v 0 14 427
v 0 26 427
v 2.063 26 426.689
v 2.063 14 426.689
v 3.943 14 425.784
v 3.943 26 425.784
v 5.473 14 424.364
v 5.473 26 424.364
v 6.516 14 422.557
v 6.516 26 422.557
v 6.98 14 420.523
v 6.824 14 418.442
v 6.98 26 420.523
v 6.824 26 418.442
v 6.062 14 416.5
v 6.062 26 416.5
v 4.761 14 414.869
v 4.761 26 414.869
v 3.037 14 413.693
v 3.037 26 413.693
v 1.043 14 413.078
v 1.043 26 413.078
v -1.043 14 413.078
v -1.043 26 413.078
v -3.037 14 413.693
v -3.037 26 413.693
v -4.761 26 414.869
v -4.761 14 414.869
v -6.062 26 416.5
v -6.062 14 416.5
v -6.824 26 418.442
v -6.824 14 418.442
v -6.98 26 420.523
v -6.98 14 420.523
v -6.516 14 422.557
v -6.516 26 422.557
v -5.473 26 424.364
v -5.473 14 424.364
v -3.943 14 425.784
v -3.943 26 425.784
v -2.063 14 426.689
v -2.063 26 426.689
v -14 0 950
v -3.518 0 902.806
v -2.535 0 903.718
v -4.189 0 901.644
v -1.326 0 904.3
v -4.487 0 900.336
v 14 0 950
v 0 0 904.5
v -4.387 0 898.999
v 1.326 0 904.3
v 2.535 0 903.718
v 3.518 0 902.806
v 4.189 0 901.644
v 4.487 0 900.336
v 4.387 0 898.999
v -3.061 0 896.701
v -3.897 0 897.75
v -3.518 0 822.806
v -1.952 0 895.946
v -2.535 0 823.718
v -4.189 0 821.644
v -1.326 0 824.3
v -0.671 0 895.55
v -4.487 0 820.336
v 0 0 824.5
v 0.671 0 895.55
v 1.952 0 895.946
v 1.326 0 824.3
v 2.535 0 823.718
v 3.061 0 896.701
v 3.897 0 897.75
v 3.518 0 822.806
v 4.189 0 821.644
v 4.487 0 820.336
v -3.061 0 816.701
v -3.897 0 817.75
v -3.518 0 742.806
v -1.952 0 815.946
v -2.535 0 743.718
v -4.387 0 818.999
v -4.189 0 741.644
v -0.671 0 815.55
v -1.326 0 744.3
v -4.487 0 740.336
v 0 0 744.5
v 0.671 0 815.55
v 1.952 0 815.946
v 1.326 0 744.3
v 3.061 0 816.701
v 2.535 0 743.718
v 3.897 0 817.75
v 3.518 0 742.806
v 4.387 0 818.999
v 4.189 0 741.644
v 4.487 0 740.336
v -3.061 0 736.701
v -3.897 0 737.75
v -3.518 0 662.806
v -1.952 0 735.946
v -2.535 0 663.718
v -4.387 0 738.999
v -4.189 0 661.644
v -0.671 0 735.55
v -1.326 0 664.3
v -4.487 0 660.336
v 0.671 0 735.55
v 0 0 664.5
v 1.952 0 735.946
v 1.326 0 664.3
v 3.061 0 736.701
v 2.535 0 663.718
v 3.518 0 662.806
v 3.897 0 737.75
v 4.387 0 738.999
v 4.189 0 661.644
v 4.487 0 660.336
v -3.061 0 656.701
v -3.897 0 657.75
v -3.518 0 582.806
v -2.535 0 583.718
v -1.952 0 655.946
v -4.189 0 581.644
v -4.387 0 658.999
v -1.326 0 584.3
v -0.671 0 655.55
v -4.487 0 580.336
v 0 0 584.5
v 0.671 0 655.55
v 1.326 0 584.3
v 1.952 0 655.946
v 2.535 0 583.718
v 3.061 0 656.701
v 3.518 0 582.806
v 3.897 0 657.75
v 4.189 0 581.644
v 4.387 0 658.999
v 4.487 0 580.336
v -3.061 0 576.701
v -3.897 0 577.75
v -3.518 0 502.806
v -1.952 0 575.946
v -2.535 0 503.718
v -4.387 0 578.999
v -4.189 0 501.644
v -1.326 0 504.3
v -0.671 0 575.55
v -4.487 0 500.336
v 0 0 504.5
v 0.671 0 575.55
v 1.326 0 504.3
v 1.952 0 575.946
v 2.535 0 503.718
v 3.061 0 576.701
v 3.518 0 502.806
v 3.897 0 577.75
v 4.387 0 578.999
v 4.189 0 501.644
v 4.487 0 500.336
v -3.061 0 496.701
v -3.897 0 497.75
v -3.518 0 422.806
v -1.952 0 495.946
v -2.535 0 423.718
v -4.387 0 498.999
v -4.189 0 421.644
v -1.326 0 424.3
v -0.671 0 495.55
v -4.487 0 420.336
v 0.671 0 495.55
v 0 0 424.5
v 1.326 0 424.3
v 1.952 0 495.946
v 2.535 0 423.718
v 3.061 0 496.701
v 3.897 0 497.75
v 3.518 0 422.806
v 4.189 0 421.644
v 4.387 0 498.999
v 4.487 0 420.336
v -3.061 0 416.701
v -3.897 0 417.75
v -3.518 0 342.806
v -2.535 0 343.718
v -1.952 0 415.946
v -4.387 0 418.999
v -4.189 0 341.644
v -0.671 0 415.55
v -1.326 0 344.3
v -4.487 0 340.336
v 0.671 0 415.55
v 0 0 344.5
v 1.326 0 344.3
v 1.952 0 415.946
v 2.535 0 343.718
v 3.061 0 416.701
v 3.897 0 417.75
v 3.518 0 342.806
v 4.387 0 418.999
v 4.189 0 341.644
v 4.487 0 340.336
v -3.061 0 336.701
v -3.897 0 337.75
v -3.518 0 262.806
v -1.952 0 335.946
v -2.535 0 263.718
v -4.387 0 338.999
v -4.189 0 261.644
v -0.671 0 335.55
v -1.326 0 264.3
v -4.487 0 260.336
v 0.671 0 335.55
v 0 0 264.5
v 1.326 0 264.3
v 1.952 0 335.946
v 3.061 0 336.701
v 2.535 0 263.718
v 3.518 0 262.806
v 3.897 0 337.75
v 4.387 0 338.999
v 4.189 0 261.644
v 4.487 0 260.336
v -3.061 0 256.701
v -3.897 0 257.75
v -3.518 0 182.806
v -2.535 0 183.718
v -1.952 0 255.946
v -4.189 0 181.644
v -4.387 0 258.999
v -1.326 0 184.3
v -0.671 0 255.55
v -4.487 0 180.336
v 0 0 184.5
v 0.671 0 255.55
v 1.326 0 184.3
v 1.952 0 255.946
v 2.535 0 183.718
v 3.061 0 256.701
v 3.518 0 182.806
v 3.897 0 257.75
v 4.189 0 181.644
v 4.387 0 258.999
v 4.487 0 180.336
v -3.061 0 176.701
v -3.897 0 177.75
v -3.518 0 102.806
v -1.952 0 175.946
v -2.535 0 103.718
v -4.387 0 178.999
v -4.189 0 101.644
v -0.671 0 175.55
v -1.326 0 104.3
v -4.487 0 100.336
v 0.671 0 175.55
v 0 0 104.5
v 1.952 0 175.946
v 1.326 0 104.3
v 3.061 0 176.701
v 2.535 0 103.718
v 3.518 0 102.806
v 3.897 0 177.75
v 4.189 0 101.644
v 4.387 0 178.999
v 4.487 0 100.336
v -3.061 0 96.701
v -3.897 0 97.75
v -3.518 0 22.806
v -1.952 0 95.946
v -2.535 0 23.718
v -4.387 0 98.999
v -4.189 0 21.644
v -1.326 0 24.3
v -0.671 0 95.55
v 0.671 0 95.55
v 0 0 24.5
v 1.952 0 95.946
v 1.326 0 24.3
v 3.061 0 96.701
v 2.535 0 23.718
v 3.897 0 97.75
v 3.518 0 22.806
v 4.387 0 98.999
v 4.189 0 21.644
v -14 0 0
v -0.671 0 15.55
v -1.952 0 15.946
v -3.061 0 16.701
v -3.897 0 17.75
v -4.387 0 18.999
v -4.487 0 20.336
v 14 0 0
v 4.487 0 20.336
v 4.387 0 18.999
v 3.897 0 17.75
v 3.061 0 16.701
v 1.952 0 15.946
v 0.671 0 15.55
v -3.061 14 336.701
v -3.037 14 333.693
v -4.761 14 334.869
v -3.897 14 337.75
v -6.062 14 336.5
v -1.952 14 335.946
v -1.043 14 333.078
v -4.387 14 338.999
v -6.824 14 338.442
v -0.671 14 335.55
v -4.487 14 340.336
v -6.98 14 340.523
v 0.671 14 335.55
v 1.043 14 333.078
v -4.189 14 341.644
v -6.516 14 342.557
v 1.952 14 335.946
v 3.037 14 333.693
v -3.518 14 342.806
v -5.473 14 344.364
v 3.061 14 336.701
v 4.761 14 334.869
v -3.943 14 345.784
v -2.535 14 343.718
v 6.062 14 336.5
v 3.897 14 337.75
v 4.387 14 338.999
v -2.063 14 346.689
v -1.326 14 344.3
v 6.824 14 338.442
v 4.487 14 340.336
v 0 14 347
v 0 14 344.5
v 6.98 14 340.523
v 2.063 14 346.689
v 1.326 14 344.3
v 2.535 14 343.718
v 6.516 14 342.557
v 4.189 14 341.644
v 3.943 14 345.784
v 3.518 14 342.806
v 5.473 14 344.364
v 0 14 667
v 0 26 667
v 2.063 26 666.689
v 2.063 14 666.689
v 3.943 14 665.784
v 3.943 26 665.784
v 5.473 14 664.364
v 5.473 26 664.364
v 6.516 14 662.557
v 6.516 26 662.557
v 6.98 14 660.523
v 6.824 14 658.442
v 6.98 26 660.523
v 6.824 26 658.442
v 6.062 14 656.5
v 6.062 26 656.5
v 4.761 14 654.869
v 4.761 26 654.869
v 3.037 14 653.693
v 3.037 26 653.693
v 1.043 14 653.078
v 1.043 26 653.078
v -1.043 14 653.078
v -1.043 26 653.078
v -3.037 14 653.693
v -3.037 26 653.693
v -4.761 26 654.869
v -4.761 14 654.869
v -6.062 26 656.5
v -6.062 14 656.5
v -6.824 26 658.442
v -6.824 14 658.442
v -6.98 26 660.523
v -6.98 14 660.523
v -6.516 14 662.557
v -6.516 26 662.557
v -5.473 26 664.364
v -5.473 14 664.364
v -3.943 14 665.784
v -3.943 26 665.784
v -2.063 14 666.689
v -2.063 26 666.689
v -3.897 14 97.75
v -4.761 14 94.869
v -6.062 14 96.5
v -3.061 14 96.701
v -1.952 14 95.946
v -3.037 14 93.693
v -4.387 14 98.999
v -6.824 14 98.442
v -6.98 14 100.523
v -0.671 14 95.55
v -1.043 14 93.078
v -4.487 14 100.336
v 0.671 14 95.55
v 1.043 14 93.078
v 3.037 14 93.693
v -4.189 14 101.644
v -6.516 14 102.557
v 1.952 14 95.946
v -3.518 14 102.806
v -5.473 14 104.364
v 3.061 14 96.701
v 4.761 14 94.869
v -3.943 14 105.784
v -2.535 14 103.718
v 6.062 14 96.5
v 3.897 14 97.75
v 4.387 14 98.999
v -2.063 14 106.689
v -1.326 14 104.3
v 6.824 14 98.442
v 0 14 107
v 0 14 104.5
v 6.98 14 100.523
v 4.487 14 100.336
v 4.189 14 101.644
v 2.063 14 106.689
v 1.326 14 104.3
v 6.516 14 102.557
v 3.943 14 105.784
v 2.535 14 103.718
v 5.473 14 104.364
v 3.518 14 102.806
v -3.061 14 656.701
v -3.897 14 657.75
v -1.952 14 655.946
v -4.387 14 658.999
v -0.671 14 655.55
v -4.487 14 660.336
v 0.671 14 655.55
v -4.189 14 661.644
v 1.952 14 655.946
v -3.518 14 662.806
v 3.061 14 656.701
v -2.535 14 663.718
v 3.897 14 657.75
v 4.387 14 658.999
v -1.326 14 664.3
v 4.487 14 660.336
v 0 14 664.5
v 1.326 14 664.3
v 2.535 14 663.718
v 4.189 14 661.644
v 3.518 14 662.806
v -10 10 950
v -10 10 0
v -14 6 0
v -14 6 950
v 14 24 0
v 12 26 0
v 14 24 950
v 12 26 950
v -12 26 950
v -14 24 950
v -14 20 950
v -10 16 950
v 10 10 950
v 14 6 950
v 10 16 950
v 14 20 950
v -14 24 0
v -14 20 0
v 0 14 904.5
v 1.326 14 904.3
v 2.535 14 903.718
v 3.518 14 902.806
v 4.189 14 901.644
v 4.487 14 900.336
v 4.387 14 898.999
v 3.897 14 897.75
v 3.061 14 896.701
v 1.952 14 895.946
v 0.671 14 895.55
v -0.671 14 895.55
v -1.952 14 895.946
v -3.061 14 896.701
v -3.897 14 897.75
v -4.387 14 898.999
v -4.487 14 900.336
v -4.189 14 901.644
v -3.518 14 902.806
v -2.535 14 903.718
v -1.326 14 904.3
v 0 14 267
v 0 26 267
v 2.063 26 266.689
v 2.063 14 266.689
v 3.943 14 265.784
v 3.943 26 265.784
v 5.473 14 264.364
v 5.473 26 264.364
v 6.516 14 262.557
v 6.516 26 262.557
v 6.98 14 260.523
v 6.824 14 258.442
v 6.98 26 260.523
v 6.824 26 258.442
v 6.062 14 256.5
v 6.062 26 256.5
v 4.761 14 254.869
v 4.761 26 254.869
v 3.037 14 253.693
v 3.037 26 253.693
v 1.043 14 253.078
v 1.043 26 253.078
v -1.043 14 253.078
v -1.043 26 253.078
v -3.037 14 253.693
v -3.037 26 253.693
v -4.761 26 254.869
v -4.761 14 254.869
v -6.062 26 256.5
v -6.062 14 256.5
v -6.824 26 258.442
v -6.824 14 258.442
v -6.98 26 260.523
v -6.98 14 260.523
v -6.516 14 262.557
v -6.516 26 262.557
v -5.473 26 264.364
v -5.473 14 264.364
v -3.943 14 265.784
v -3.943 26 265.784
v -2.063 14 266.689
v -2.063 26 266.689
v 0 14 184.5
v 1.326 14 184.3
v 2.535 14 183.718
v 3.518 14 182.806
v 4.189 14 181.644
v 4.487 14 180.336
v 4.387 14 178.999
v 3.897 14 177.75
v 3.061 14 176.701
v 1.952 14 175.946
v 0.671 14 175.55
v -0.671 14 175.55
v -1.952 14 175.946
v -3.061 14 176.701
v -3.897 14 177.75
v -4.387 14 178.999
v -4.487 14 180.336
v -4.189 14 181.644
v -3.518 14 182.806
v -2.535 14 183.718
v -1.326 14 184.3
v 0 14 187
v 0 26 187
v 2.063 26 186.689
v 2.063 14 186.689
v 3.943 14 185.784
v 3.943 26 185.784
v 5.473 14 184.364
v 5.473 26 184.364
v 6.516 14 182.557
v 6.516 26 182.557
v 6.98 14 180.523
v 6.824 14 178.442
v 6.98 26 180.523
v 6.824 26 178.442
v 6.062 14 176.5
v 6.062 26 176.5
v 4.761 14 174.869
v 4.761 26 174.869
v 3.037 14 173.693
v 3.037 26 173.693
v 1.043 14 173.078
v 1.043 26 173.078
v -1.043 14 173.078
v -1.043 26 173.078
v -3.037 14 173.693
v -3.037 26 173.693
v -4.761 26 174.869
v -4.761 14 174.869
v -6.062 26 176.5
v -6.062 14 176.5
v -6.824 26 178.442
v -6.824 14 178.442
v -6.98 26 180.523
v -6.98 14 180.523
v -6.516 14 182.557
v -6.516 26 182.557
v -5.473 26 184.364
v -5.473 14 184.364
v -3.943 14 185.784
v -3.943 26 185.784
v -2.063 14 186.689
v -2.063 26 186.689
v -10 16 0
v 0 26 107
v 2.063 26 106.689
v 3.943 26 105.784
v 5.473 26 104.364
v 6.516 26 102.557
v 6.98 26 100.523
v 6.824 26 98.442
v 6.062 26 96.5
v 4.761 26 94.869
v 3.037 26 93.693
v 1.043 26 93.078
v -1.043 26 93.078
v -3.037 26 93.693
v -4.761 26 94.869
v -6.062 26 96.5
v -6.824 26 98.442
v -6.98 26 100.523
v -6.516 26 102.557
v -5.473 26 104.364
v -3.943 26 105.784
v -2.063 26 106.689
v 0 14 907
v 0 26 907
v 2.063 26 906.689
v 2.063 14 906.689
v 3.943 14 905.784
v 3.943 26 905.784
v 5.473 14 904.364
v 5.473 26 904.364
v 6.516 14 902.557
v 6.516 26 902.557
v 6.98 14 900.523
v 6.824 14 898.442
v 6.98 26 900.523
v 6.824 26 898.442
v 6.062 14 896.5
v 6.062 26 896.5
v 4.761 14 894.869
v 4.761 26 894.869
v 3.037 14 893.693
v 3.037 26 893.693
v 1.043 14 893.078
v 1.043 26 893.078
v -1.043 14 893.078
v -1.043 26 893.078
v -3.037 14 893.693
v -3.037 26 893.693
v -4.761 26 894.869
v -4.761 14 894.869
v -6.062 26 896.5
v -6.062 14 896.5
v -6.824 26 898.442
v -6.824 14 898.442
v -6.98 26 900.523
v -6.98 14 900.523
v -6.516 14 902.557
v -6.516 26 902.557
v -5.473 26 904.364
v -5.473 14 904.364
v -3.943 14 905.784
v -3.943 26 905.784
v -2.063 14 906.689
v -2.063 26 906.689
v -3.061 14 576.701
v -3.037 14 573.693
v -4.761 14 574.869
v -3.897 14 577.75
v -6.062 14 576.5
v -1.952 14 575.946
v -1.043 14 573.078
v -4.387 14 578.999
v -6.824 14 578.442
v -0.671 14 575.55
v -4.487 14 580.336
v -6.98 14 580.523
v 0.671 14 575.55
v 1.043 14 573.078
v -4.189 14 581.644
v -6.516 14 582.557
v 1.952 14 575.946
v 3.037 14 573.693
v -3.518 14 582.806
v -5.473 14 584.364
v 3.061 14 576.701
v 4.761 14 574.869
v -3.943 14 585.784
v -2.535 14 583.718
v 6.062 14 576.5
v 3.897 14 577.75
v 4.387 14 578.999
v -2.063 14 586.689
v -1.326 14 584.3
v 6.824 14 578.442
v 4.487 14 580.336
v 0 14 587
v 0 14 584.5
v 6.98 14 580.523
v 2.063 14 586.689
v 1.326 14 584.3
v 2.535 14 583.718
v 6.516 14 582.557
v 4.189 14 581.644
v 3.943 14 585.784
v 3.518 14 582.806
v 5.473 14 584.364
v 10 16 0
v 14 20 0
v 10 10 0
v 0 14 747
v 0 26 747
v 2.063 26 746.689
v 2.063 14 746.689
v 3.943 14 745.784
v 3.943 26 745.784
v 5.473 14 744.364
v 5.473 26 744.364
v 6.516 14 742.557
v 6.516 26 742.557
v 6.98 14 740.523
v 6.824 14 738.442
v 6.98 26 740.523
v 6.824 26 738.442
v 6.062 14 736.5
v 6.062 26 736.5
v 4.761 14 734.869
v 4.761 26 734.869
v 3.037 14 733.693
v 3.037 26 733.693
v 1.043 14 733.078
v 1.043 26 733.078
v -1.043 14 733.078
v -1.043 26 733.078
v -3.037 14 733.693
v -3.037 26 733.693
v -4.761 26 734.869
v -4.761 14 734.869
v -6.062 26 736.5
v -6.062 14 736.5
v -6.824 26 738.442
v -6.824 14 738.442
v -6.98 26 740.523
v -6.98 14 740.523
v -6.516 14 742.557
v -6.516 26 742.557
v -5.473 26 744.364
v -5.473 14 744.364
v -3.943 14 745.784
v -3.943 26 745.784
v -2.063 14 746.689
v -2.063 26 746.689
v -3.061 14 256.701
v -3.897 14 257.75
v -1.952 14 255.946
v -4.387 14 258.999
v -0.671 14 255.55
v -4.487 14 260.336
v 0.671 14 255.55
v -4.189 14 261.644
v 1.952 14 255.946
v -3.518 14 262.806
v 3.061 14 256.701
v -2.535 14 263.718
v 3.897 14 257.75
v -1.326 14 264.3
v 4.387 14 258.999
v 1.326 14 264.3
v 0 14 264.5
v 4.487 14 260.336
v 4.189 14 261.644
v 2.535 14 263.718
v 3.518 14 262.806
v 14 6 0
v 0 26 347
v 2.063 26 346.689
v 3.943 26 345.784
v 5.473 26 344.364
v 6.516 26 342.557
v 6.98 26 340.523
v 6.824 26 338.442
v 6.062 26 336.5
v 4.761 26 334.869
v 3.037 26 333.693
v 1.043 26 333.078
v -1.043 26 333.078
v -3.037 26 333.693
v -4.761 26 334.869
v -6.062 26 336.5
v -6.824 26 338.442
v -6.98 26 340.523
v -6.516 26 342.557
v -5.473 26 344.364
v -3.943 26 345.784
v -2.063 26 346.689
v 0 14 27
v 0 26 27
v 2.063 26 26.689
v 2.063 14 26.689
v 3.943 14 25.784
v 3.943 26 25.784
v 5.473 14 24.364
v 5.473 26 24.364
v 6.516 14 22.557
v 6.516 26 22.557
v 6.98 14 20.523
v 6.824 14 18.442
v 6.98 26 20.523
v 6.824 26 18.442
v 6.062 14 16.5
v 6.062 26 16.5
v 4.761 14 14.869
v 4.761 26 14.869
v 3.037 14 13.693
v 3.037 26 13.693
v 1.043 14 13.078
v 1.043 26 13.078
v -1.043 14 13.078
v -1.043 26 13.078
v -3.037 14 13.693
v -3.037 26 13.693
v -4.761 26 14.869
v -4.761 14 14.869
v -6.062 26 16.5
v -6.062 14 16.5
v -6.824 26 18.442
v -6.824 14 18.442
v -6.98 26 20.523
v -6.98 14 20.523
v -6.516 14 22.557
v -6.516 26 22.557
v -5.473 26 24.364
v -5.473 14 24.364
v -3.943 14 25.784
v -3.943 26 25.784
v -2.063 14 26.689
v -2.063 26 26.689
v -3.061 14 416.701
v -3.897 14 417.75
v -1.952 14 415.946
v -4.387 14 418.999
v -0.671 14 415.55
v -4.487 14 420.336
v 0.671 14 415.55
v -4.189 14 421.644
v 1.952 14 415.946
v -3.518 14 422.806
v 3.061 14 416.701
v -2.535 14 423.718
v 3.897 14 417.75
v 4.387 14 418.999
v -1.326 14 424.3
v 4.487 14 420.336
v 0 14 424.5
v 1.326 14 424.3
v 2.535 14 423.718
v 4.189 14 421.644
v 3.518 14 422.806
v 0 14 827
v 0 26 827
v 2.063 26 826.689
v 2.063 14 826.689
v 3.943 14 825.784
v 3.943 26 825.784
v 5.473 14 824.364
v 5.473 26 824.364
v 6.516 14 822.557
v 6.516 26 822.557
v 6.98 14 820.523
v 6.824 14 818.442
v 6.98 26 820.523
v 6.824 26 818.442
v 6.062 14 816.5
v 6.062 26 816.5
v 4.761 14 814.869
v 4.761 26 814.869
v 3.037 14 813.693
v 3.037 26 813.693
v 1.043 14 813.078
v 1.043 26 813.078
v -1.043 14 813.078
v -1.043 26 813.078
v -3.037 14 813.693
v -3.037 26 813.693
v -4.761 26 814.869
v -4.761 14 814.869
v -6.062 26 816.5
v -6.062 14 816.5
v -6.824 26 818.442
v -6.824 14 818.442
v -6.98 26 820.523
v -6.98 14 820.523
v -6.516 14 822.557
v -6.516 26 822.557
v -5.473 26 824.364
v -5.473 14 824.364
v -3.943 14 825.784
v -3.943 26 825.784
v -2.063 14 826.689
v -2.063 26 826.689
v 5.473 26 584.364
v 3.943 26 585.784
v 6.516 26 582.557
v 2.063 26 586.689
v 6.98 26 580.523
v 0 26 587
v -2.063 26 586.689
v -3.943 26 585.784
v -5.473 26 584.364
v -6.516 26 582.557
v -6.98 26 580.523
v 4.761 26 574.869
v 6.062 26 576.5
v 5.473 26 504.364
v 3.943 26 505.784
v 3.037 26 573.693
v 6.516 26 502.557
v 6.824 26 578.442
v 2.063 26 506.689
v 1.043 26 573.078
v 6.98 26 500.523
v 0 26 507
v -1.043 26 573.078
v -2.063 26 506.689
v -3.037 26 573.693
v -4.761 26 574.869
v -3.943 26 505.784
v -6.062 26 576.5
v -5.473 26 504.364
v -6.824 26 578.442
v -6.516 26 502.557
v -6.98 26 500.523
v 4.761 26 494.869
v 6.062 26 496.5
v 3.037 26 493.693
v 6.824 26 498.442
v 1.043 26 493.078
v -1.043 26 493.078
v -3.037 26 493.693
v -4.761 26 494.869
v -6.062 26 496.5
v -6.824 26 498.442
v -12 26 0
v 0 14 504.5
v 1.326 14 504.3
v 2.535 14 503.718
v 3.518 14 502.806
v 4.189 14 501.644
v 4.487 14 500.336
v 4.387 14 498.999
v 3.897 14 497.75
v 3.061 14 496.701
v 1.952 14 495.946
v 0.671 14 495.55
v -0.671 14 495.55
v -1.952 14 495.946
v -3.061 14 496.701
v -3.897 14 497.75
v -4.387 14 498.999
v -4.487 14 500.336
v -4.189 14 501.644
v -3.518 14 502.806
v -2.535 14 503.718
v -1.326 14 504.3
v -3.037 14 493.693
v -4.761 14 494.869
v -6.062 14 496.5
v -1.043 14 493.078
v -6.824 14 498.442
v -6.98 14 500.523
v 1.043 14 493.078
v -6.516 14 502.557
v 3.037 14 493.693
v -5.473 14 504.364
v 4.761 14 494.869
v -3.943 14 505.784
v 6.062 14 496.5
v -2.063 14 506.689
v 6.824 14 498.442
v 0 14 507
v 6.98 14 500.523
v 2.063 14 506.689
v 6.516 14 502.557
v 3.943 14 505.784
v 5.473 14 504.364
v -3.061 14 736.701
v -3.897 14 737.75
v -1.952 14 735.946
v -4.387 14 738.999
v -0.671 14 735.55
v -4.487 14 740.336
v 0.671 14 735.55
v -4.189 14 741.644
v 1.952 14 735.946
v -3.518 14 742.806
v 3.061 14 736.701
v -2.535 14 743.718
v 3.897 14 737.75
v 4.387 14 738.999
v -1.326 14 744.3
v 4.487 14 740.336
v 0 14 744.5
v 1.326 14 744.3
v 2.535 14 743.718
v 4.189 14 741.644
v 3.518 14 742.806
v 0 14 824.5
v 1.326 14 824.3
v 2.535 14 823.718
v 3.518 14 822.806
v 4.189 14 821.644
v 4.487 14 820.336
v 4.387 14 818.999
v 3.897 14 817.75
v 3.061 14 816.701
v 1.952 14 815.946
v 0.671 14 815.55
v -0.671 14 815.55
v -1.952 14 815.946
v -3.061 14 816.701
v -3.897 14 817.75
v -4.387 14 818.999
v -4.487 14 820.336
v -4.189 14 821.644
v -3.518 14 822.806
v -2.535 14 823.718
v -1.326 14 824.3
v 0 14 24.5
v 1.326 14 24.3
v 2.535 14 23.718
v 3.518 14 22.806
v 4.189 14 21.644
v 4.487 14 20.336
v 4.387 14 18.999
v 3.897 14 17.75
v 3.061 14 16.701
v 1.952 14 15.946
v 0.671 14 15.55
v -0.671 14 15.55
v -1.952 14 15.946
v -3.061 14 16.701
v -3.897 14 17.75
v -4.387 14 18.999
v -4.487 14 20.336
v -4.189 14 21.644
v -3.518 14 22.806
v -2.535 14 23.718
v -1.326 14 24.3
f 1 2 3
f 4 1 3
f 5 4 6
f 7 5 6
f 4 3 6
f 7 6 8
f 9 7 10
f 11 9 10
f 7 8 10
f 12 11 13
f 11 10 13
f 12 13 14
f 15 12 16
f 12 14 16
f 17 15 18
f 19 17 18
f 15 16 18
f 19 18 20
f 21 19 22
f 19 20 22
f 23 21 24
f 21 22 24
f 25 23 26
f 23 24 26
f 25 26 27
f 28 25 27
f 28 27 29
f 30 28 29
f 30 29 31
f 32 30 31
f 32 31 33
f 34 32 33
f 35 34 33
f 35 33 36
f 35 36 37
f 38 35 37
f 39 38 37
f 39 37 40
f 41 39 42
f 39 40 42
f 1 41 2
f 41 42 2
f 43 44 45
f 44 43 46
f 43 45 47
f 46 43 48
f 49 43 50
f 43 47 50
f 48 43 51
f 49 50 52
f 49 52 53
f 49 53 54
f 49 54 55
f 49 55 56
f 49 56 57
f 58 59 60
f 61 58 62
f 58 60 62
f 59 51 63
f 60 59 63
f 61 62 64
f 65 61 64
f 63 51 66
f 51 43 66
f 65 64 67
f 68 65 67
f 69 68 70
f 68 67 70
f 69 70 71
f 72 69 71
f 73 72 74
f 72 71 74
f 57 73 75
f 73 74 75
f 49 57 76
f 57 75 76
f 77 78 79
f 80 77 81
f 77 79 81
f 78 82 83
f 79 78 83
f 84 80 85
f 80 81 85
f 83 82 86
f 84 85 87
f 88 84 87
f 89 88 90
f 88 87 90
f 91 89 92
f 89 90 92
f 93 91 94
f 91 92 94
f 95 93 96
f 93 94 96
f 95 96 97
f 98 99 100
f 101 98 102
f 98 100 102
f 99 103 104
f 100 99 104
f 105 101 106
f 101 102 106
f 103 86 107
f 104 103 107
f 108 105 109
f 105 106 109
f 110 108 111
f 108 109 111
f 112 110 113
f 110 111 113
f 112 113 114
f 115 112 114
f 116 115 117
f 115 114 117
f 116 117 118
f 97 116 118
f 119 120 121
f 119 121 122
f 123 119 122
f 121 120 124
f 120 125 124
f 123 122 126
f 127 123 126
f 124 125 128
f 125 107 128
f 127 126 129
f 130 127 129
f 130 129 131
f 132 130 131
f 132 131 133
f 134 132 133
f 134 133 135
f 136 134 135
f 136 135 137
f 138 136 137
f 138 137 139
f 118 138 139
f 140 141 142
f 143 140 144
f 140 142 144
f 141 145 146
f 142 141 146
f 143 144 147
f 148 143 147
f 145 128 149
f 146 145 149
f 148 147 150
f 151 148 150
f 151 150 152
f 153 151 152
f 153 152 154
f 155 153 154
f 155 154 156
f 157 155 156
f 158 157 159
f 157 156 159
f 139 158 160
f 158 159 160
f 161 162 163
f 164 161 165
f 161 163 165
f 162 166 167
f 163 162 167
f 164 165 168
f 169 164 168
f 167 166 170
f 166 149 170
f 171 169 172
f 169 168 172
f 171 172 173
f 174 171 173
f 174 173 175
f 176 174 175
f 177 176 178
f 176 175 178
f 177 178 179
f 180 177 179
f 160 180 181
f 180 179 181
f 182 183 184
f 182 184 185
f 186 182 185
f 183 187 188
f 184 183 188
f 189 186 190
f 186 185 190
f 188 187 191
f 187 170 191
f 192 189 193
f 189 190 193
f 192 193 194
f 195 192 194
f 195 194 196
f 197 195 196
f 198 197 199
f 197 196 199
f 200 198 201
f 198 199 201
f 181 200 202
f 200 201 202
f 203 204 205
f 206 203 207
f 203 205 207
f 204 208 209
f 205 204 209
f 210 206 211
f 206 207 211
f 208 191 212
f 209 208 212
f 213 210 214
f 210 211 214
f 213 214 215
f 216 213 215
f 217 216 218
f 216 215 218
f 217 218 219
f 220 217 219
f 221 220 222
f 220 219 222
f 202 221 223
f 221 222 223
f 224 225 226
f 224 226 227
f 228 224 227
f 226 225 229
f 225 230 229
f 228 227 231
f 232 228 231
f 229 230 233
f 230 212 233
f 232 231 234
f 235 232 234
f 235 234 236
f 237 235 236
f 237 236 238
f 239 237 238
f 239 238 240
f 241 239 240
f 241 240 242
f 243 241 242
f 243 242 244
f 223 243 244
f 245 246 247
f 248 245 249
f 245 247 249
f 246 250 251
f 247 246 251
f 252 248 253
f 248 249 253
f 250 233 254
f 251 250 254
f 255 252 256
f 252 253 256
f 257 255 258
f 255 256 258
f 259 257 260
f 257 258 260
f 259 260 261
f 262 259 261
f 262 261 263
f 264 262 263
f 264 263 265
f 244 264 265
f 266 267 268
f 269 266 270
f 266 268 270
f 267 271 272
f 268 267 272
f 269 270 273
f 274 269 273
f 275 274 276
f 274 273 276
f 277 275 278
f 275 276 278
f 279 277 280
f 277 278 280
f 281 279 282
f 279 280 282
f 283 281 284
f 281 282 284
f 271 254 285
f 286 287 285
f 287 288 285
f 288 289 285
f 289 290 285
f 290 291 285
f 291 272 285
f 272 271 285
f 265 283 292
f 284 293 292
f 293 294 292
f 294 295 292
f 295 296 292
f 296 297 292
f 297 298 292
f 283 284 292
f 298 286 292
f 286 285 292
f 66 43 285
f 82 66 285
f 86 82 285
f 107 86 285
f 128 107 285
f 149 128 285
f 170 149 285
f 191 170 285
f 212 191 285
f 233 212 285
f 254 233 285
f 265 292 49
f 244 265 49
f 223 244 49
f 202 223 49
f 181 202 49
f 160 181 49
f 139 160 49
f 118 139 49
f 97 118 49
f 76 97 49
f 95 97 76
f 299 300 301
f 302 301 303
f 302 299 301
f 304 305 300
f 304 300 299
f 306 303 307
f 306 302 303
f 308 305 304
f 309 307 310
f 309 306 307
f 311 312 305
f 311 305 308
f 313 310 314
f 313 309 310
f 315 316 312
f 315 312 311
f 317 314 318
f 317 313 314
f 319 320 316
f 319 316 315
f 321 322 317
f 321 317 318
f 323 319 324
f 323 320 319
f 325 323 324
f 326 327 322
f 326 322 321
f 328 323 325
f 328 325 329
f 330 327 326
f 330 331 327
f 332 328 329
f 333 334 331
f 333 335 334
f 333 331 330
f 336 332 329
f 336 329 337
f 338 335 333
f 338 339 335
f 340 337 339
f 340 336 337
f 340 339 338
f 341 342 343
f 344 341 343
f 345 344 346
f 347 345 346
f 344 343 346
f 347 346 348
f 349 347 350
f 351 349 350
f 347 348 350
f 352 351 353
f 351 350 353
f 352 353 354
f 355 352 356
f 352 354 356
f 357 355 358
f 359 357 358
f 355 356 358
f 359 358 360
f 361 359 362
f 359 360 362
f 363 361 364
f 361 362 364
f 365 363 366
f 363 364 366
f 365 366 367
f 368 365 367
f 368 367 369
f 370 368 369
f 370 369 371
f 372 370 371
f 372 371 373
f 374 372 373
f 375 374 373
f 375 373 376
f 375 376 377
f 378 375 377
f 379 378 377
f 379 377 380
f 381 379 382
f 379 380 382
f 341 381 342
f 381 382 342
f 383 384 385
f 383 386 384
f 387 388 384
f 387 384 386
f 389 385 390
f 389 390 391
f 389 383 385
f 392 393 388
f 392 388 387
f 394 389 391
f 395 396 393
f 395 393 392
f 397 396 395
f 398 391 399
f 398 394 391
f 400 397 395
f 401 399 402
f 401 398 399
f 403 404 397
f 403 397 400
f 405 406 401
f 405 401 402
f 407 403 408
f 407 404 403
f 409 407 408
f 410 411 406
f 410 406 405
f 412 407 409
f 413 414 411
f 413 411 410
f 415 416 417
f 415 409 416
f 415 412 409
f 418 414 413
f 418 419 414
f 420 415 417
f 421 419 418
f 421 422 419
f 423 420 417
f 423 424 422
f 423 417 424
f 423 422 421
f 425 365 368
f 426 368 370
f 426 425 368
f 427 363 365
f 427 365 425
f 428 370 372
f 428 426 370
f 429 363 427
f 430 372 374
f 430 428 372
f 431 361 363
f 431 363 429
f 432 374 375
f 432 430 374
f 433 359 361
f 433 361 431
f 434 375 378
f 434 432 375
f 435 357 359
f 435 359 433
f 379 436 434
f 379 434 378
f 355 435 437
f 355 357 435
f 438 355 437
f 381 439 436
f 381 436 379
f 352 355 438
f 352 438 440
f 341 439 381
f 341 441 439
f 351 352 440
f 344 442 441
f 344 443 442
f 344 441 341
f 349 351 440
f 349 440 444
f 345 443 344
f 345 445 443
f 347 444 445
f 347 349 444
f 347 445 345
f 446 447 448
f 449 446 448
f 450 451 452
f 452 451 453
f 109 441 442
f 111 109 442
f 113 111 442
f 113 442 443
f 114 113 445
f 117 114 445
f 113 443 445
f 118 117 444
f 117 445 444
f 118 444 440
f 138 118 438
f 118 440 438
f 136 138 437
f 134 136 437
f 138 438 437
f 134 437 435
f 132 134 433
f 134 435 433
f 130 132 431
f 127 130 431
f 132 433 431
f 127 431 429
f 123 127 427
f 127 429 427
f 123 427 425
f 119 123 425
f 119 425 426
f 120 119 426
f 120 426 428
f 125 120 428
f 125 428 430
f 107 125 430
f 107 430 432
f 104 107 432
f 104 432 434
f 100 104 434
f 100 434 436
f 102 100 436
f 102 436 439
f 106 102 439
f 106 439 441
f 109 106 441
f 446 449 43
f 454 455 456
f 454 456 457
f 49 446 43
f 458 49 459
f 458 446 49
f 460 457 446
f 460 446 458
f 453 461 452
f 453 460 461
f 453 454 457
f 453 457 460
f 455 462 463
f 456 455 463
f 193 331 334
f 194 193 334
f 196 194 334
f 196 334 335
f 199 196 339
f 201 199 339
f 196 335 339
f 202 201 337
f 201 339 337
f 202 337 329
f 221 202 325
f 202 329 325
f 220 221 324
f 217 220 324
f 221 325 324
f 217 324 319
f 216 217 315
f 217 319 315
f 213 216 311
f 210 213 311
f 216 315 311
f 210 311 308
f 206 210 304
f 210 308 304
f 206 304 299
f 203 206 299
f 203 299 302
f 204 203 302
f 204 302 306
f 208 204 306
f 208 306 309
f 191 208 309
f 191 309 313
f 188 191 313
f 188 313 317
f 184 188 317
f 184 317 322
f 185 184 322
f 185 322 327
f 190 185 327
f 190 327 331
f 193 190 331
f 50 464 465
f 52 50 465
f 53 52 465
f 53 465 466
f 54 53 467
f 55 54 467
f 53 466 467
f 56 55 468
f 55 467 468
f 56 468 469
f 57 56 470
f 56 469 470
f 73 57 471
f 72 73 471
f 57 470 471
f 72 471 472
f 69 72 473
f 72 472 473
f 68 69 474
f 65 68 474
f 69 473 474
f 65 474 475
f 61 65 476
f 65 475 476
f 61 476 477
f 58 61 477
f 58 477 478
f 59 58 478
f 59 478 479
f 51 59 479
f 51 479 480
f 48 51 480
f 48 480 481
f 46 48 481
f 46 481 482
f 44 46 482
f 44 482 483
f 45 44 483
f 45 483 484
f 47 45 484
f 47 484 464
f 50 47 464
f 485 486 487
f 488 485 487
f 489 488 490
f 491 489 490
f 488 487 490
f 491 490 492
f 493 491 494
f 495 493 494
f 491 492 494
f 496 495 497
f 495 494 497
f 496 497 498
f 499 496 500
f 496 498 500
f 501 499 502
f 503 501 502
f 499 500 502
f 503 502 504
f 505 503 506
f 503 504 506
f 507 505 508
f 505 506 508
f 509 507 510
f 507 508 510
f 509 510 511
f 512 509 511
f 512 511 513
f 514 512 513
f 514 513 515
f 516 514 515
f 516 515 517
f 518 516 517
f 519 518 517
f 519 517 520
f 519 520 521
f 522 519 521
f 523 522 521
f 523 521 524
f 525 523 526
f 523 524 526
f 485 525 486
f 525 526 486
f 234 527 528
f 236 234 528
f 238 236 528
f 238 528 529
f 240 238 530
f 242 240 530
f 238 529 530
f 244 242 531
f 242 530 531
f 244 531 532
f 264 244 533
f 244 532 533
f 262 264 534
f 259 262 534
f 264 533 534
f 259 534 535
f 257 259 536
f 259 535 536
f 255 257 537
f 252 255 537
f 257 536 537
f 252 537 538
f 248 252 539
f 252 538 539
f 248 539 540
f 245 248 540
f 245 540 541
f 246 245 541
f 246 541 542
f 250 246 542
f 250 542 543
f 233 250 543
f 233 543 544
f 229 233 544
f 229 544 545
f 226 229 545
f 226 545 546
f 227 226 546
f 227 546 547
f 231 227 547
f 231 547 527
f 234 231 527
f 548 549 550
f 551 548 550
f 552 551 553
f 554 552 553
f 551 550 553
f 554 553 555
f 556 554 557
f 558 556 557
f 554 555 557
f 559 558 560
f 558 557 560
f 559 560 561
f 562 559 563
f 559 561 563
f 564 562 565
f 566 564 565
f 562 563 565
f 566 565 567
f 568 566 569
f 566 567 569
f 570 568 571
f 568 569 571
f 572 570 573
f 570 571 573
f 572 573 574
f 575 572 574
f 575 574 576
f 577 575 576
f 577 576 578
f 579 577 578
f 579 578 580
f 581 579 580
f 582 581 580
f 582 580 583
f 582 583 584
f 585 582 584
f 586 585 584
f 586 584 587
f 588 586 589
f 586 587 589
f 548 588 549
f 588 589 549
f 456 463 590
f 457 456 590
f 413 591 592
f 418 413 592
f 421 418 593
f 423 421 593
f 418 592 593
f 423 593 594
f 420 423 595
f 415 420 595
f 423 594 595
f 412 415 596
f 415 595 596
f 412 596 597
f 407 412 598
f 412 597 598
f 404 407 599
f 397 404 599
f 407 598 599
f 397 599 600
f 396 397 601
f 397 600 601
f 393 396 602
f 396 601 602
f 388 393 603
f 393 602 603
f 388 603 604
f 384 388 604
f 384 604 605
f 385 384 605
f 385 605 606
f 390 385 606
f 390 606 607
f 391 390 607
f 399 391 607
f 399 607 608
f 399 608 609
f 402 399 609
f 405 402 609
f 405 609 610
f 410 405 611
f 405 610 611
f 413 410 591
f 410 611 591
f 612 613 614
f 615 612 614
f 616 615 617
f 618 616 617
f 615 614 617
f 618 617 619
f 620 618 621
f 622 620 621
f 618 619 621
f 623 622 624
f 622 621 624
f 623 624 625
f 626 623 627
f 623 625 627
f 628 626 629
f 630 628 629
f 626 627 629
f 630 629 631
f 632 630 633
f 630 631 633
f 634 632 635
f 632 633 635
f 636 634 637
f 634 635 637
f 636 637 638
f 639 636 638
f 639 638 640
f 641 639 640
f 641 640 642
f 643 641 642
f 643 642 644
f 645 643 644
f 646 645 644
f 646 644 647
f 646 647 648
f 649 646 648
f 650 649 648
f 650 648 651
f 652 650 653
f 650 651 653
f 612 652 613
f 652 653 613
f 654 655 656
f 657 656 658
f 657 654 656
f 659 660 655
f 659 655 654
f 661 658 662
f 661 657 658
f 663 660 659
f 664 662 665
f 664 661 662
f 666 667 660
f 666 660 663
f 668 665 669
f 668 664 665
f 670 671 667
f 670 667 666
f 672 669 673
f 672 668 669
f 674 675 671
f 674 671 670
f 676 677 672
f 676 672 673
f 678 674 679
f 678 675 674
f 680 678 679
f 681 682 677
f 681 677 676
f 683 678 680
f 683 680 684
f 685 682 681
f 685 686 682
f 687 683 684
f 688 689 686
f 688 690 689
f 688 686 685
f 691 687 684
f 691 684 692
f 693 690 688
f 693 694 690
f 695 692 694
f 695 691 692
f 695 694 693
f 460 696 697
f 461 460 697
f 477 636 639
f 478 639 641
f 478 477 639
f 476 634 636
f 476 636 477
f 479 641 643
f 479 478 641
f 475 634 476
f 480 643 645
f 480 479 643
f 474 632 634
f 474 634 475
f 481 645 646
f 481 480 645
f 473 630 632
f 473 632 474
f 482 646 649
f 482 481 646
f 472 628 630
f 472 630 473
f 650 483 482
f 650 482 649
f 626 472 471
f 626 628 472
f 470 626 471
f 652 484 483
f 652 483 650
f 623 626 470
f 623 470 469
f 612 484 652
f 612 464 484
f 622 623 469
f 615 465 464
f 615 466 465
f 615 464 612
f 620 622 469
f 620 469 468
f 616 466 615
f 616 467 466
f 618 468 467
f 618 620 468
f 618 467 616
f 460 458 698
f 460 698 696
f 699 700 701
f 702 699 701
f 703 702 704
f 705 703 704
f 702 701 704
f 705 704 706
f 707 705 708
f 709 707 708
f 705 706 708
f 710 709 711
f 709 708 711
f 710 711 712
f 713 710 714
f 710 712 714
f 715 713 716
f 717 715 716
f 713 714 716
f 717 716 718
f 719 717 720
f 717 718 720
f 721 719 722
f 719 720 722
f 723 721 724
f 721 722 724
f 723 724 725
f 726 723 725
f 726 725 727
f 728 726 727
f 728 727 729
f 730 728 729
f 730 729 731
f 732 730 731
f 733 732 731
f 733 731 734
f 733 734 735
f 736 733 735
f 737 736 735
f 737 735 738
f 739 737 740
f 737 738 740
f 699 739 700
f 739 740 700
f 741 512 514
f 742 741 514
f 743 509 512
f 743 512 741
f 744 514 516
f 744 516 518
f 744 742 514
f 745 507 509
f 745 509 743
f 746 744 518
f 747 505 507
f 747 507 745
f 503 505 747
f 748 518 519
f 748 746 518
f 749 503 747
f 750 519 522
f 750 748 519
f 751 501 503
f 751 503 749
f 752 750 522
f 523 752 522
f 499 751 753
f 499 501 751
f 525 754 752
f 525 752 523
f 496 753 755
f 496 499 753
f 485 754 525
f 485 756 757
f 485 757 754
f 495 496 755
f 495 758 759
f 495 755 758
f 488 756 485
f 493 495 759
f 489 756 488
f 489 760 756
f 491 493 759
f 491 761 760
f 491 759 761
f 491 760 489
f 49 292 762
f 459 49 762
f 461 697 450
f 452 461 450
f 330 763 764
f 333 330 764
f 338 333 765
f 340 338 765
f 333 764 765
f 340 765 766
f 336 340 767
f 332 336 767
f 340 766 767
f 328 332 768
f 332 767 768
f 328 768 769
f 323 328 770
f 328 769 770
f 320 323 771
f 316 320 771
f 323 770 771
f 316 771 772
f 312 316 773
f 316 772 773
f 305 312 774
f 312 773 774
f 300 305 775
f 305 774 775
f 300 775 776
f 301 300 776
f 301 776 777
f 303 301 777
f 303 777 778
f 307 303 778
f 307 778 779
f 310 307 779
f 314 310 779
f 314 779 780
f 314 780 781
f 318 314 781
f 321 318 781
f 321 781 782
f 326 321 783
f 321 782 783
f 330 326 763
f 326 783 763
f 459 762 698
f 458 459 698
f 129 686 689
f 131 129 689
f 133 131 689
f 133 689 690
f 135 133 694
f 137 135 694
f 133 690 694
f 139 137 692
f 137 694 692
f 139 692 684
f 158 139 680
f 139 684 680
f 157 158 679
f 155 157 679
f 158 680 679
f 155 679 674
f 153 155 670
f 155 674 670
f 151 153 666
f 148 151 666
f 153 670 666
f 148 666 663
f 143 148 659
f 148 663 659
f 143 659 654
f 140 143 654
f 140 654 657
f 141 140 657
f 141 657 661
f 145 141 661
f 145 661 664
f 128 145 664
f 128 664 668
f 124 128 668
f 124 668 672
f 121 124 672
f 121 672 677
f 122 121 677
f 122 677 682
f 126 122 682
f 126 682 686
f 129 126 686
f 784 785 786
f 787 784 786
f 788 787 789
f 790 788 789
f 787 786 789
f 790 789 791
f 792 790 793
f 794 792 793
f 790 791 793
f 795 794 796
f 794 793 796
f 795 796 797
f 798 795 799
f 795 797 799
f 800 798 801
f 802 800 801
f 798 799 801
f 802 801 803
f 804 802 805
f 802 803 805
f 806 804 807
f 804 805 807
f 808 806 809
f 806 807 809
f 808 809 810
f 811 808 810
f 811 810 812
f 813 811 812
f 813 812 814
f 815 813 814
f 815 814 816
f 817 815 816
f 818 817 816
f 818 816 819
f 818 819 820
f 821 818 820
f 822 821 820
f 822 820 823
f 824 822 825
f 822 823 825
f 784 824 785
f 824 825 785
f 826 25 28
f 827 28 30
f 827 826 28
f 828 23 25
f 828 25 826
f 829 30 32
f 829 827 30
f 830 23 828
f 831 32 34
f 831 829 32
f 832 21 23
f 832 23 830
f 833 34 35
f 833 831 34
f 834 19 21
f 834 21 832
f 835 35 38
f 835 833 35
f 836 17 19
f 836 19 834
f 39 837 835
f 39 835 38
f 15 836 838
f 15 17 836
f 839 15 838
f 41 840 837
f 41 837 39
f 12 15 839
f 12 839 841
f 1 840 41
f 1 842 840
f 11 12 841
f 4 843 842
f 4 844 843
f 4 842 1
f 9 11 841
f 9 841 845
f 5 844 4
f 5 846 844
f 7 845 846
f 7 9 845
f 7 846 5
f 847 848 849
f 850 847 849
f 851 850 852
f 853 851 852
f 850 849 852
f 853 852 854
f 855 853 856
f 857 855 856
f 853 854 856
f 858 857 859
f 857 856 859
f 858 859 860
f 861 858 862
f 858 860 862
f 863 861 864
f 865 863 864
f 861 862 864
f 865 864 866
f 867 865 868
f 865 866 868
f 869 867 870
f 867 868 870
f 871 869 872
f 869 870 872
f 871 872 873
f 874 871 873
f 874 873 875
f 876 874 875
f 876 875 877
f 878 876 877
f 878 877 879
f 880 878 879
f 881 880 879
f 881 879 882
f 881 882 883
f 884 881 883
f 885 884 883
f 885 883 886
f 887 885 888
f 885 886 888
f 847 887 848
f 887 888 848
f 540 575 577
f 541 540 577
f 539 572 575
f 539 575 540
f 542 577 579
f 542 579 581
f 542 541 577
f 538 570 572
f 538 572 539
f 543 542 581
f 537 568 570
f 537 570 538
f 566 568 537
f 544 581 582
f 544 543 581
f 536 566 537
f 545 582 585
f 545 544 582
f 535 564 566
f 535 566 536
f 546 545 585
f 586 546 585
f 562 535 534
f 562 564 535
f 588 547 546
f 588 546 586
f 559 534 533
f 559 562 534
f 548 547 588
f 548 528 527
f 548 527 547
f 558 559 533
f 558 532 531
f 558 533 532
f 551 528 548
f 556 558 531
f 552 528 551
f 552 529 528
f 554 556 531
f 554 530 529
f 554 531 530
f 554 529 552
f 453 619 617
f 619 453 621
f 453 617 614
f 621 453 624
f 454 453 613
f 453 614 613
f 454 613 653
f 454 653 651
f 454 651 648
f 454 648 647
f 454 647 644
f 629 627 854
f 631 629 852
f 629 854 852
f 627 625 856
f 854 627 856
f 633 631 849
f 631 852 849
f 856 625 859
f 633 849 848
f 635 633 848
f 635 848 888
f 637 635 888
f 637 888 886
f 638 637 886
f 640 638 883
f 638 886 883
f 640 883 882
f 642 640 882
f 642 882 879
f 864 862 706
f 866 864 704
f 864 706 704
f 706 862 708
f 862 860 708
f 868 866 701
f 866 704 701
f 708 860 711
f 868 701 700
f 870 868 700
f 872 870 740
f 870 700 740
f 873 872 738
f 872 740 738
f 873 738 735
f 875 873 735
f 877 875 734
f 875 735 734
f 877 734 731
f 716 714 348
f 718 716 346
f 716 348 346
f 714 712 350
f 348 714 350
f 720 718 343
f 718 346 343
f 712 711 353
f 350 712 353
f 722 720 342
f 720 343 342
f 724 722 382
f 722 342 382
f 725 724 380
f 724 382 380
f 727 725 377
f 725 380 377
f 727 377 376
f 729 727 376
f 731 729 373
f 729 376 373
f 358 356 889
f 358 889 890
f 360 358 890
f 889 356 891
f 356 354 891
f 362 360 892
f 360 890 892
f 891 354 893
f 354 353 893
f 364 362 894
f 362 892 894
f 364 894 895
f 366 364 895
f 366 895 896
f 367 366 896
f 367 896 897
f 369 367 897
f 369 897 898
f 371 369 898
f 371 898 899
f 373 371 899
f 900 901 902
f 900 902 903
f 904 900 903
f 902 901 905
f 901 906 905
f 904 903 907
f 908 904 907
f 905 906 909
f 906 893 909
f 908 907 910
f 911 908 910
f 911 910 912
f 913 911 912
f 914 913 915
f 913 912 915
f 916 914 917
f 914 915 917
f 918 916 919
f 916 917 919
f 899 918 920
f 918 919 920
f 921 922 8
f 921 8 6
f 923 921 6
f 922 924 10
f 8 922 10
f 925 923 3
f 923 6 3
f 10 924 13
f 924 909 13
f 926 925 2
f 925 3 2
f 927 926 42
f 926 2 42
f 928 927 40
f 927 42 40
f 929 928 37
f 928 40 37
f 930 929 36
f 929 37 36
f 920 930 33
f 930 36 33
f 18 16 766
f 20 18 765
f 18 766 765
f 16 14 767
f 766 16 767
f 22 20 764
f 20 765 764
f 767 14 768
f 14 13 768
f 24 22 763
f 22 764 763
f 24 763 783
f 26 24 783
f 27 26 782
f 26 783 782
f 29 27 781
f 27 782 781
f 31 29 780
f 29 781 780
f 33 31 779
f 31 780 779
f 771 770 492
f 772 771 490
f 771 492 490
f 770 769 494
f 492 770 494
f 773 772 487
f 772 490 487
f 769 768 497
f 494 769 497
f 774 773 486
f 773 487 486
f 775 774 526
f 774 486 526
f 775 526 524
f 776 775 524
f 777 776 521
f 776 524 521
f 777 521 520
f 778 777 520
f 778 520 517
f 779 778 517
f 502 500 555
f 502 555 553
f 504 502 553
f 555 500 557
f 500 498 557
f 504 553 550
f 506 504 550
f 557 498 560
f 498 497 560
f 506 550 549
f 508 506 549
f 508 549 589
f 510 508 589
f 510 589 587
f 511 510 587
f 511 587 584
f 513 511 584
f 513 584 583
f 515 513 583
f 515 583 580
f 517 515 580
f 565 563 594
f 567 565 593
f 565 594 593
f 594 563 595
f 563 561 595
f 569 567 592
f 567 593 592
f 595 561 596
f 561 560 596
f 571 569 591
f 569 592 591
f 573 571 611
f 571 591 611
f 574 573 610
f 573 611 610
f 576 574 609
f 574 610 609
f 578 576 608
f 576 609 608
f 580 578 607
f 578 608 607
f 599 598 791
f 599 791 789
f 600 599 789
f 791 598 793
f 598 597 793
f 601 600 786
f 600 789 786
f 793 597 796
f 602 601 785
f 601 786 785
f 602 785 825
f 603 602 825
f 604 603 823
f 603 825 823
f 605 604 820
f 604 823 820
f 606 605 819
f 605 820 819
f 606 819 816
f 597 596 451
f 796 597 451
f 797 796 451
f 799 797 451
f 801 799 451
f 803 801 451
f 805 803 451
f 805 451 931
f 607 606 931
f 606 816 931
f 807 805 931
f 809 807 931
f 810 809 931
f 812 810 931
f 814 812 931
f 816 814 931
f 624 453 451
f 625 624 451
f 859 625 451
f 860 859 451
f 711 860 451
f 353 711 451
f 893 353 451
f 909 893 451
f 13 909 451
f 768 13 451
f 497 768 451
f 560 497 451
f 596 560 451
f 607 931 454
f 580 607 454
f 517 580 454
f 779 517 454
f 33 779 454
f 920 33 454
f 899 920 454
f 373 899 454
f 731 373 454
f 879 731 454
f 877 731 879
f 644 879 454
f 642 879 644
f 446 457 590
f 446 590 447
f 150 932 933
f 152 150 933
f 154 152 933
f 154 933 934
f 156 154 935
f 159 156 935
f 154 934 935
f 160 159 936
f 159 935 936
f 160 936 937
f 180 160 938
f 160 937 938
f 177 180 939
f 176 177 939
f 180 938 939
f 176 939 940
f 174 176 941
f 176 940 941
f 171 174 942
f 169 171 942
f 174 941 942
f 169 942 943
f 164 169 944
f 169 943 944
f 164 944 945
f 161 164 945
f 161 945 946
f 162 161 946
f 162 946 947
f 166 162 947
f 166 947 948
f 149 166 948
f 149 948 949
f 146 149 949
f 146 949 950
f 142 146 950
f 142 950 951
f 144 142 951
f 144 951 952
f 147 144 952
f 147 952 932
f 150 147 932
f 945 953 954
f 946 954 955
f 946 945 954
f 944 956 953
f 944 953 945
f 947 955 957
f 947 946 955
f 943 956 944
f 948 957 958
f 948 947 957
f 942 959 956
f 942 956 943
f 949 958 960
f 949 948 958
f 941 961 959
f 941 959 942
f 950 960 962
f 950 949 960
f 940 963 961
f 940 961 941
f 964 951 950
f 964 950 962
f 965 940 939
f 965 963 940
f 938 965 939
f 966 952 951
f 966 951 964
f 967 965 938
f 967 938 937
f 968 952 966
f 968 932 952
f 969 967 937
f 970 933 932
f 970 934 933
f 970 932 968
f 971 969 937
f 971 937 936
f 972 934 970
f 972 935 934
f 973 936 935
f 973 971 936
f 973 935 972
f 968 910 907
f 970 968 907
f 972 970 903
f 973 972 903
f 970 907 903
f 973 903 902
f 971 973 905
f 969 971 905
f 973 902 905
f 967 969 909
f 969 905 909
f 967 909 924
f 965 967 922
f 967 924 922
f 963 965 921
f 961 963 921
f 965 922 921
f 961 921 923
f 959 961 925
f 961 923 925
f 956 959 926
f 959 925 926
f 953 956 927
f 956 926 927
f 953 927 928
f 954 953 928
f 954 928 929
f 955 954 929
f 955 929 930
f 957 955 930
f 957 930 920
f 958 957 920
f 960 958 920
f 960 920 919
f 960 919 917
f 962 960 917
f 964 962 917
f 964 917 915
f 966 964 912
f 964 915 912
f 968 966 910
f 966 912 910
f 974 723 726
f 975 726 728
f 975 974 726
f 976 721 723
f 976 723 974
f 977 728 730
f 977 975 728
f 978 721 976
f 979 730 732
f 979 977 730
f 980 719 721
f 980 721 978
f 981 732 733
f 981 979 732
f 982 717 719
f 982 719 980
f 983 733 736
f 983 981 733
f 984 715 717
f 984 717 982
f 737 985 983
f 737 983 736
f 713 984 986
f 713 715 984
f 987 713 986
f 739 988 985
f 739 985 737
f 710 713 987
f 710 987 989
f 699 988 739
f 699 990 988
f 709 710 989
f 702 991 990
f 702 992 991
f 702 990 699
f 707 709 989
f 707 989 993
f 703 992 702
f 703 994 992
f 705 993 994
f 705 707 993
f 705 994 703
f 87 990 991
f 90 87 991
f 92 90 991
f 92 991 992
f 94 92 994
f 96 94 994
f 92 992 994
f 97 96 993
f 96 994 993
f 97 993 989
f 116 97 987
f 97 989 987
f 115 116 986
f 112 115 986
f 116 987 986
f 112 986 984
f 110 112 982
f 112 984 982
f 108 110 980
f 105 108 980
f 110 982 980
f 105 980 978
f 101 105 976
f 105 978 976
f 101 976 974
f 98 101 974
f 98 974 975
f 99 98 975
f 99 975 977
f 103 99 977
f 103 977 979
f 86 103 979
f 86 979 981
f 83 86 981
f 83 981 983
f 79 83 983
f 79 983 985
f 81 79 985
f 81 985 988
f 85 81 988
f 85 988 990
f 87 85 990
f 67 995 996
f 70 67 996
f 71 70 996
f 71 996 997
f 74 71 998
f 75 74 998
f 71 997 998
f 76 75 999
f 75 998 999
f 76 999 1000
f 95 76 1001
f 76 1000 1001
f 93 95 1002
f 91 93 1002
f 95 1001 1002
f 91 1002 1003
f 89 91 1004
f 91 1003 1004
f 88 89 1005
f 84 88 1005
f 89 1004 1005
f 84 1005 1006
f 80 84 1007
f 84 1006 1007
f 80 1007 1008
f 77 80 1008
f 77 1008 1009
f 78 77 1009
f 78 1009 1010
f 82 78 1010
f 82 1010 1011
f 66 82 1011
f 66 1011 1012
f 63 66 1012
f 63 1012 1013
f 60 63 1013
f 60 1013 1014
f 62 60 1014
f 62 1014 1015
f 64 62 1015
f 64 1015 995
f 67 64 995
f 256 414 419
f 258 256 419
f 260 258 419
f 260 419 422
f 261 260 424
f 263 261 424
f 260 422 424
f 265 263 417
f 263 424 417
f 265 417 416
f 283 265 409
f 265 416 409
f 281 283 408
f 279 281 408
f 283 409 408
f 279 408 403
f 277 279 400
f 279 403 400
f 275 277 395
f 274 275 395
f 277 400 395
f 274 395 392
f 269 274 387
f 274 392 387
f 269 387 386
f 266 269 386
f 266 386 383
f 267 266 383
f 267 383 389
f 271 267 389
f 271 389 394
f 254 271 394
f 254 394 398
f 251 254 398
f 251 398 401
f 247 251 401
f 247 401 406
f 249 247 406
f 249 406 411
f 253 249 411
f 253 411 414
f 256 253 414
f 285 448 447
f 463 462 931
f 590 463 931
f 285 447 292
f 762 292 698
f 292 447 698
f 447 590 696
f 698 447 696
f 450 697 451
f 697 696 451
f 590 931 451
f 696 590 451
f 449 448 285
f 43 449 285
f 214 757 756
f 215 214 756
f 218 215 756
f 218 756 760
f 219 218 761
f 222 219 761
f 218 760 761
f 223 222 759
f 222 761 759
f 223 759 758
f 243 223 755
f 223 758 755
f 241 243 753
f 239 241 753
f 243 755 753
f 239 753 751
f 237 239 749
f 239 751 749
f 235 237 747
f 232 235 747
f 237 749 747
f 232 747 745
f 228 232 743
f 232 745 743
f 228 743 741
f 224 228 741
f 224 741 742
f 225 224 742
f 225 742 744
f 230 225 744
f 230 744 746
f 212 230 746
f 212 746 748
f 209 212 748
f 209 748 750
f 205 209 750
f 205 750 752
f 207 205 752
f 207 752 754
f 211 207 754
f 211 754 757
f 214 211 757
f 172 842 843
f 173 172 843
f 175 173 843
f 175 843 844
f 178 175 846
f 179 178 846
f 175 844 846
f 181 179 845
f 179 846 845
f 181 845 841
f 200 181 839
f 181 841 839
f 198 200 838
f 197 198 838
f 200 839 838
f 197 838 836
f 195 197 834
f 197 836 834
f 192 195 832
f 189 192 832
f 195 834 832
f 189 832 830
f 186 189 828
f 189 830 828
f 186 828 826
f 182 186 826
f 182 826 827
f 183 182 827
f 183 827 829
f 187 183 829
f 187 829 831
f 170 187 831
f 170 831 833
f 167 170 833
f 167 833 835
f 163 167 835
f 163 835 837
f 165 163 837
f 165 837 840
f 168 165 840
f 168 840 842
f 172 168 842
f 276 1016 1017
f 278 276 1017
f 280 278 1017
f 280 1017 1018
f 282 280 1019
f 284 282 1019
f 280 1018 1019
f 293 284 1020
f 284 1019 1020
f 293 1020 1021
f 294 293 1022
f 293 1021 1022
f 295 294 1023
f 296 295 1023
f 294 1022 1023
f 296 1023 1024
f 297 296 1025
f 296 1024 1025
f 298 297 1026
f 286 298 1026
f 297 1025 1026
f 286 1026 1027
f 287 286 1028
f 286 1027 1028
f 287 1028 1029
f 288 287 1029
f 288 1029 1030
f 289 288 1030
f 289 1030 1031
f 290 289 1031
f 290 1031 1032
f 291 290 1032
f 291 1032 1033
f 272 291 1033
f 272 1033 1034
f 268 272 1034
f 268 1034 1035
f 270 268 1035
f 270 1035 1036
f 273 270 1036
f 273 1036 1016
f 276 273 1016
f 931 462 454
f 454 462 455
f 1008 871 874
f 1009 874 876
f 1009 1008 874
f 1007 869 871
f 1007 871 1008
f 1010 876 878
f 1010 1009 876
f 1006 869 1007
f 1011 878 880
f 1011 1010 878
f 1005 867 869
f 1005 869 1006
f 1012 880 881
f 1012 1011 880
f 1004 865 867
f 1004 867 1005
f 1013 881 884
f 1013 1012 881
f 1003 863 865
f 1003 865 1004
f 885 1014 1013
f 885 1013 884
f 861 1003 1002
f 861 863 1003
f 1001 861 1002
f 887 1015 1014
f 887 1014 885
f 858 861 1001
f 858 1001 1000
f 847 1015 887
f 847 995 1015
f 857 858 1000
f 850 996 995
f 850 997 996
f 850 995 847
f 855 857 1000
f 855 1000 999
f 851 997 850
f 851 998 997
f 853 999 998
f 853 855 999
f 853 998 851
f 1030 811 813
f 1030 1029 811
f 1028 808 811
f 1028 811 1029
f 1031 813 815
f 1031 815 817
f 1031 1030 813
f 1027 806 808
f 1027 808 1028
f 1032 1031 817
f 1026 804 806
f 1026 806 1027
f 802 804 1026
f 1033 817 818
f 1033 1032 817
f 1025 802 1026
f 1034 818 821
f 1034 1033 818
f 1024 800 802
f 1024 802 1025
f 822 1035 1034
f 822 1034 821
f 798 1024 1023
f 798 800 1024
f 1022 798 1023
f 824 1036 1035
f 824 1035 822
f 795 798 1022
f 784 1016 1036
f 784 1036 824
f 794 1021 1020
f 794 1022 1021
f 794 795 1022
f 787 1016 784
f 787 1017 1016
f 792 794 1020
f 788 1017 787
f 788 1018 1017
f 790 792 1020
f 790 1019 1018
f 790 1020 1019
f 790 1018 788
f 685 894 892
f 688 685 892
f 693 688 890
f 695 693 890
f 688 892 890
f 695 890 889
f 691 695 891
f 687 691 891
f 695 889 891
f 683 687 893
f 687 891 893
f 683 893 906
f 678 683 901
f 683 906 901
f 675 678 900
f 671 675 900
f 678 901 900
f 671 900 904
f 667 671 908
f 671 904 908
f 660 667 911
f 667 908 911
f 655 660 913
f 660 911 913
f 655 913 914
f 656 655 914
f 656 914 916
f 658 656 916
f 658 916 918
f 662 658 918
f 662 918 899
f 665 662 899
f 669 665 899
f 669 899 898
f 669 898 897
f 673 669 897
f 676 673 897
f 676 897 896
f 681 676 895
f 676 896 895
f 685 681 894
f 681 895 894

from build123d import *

# Parameters (mm, degrees)
EXTRUDE_1_DEPTH        = 950
CHAMFER_1_SIZE         = 2
SKETCH_2_R             = 7
CUT_EXTRUDE_1_DEPTH    = 12
PATTERN_LINEAR_1_COUNT = 12
PATTERN_LINEAR_1_PITCH = 80
SKETCH_3_R             = 4.5
CUT_EXTRUDE_2_DEPTH    = 40
PATTERN_LINEAR_2_COUNT = 12
PATTERN_LINEAR_2_PITCH = 80


with BuildPart() as part:
    # 草图1 → 凸台-拉伸1 (new body)
    with BuildSketch(Plane.XY):
        Polygon((-14, 0), (14, 0), (14, 6), (10, 10), (10, 16), (14, 20), (14, 26), (-14, 26), (-14, 20), (-10, 16), (-10, 10), (-14, 6), align=None)
    extrude(amount=EXTRUDE_1_DEPTH)

    # 倒角1
    chamfer_1_edges = [part.edges().sort_by_distance(p)[0] for p in [
        (-14, 26, 475),
        (14, 26, 475),
    ]]
    chamfer(chamfer_1_edges, length=CHAMFER_1_SIZE)

    # 草图2 → 切除-拉伸1 (cut)
    with BuildSketch(Plane(origin=(0, 26, 0), x_dir=(1, 0, 0), z_dir=(0, 1, 0))):
        with Locations(Location((0, -20, 0), (0, 0, 270))):
            Circle(SKETCH_2_R)
    cut_extrude_1 = extrude(amount=-CUT_EXTRUDE_1_DEPTH, mode=Mode.SUBTRACT)

    # 阵列(线性)1: 切除-拉伸1 ×12
    with Locations(*[(0, 0, i * PATTERN_LINEAR_1_PITCH) for i in range(1, PATTERN_LINEAR_1_COUNT)]):
        add(cut_extrude_1, mode=Mode.SUBTRACT)

    # 草图3 → 切除-拉伸2 (cut)
    with BuildSketch(Plane(origin=(0, 26, 0), x_dir=(1, 0, 0), z_dir=(0, 1, 0))):
        with Locations(Location((0, -20, 0), (0, 0, 270))):
            Circle(SKETCH_3_R)
    cut_extrude_2 = extrude(amount=-CUT_EXTRUDE_2_DEPTH, mode=Mode.SUBTRACT)

    # 阵列(线性)2: 切除-拉伸2 ×12
    with Locations(*[(0, 0, i * PATTERN_LINEAR_2_PITCH) for i in range(1, PATTERN_LINEAR_2_COUNT)]):
        add(cut_extrude_2, mode=Mode.SUBTRACT)


solid = part.part
